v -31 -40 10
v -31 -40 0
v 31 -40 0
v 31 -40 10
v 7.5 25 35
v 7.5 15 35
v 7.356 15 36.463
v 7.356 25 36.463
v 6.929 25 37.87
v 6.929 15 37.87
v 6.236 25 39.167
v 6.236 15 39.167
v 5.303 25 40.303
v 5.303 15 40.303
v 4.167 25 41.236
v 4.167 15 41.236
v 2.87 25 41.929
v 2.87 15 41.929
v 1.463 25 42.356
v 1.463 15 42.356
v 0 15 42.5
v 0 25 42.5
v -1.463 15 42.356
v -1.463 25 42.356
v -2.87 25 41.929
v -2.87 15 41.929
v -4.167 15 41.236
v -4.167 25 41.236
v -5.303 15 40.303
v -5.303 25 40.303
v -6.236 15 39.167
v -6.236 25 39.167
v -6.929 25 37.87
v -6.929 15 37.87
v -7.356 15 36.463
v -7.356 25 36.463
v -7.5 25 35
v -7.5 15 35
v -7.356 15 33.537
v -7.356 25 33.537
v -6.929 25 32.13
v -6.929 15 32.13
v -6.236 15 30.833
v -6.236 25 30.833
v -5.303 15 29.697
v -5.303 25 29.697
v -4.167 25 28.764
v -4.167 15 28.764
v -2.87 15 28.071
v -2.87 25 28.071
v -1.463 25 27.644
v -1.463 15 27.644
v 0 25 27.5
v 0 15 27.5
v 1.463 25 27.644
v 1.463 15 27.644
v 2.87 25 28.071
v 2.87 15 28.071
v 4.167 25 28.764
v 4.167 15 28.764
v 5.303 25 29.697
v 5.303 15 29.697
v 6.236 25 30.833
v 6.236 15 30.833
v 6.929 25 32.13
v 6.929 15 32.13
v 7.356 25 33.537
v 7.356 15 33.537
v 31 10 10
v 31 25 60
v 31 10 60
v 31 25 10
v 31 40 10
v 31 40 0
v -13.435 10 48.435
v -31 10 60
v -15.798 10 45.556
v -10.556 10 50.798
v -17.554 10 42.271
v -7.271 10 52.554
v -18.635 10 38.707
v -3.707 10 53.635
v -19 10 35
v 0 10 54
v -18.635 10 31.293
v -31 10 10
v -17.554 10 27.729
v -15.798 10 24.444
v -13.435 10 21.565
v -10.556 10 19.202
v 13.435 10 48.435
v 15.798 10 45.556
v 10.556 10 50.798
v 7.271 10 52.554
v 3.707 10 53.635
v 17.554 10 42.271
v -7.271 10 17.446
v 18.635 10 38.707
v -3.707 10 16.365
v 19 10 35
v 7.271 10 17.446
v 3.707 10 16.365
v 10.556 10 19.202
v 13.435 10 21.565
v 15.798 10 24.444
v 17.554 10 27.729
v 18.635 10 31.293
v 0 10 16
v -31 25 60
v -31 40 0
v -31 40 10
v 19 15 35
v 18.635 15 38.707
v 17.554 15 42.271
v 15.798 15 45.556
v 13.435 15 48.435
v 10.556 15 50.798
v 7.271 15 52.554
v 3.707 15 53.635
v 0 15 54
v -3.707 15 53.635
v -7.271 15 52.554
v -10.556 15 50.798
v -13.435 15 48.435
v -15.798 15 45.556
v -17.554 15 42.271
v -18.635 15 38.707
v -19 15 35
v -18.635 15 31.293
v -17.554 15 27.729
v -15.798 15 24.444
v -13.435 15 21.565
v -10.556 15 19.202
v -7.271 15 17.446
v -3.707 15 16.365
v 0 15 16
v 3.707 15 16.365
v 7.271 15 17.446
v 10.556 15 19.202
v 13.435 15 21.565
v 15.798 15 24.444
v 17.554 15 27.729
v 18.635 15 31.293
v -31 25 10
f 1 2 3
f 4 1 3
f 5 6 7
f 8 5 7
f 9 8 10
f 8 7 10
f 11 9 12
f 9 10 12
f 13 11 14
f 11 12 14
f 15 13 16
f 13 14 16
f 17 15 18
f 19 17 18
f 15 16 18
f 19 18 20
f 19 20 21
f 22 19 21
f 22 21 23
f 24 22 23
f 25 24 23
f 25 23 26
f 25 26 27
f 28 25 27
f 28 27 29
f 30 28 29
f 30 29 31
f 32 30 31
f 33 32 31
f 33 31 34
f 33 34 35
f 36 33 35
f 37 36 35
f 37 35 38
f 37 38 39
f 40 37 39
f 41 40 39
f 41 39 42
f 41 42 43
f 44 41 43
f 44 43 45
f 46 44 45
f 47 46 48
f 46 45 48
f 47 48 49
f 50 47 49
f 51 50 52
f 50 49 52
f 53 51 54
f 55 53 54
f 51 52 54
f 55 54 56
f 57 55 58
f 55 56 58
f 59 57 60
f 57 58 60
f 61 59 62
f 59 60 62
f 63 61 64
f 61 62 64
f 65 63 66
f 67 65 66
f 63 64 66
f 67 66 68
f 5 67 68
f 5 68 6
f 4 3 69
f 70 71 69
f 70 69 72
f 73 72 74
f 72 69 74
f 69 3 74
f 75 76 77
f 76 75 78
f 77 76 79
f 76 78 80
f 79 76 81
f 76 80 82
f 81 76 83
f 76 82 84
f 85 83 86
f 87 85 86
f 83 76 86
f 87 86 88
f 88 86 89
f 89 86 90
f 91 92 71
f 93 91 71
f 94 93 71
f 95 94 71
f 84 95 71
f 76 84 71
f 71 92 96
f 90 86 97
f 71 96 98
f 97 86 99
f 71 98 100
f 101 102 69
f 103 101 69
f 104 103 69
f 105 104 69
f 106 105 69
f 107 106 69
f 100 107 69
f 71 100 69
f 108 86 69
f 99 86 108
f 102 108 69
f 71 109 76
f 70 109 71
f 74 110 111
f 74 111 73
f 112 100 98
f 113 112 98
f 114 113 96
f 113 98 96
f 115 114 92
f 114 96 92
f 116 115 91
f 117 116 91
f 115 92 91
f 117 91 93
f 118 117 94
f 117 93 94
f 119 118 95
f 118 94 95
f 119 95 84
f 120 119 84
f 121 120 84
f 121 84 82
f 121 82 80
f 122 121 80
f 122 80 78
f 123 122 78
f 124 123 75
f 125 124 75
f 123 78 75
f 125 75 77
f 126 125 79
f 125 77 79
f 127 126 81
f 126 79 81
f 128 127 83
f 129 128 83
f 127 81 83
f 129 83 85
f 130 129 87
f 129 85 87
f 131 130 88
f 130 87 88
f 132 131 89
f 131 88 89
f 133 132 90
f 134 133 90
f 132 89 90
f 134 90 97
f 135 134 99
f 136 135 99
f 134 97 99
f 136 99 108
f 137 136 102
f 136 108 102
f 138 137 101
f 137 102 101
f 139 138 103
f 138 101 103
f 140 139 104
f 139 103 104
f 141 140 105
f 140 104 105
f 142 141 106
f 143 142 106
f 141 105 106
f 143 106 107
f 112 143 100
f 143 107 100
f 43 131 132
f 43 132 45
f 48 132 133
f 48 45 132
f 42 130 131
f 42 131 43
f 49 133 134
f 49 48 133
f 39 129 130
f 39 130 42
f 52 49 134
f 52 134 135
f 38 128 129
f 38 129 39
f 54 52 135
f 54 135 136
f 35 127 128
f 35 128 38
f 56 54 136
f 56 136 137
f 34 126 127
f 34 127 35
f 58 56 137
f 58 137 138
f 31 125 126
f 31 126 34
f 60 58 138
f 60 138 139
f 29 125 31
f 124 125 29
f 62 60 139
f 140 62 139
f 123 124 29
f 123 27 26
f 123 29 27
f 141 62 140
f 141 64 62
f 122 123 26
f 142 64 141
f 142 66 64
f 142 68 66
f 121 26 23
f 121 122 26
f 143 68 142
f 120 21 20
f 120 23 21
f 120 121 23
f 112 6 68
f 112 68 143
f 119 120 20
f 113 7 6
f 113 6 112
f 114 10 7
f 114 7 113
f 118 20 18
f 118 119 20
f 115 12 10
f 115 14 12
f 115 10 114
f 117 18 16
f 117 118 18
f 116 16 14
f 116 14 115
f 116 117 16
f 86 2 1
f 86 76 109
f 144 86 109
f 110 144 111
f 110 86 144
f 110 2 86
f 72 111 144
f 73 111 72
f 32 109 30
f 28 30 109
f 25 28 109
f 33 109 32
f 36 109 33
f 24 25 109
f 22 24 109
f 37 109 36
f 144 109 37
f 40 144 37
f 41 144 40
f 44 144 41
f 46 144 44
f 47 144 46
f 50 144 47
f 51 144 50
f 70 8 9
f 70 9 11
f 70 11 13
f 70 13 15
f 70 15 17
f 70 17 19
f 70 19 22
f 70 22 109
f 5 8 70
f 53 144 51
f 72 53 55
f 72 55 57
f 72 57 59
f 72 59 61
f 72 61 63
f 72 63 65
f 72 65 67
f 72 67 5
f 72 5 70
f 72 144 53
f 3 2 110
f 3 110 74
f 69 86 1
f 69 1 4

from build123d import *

# Parameters (mm, degrees)
F0_W     = 62
F0_H     = 15
F1_DEPTH = 60
F0_H_2   = 50
F2_DEPTH = 10
F3_R     = 19
F4_DEPTH = 5
F5_R     = 7.5
F6_DEPTH = 25.001


with BuildPart() as f1:
    # F0 (on Top) → F1 (new body)
    with BuildSketch(Plane.XY):
        with Locations((0, 17.5)):
            Rectangle(F0_W, F0_H)
    extrude(amount=F1_DEPTH)

    # F0 (on Top) → F2 (join)
    with BuildSketch(Plane.XY):
        with Locations((0, 32.5)):
            Rectangle(F0_W, F0_H)
        with Locations((0, -15)):
            Rectangle(F0_W, F0_H_2)
    extrude(amount=F2_DEPTH)

    # F3 (on face) → F4 (cut)
    with BuildSketch(Plane.XZ.offset(-10)):
        with Locations((0, 35)):
            Circle(F3_R)
    extrude(amount=-F4_DEPTH, mode=Mode.SUBTRACT)

    # F5 (on face) → F6 (cut, through all)
    with BuildSketch(Plane.XZ.offset(-15)):
        with Locations((0, 35)):
            Circle(F5_R)
    extrude(amount=-F6_DEPTH, mode=Mode.SUBTRACT)


solid = f1.part
